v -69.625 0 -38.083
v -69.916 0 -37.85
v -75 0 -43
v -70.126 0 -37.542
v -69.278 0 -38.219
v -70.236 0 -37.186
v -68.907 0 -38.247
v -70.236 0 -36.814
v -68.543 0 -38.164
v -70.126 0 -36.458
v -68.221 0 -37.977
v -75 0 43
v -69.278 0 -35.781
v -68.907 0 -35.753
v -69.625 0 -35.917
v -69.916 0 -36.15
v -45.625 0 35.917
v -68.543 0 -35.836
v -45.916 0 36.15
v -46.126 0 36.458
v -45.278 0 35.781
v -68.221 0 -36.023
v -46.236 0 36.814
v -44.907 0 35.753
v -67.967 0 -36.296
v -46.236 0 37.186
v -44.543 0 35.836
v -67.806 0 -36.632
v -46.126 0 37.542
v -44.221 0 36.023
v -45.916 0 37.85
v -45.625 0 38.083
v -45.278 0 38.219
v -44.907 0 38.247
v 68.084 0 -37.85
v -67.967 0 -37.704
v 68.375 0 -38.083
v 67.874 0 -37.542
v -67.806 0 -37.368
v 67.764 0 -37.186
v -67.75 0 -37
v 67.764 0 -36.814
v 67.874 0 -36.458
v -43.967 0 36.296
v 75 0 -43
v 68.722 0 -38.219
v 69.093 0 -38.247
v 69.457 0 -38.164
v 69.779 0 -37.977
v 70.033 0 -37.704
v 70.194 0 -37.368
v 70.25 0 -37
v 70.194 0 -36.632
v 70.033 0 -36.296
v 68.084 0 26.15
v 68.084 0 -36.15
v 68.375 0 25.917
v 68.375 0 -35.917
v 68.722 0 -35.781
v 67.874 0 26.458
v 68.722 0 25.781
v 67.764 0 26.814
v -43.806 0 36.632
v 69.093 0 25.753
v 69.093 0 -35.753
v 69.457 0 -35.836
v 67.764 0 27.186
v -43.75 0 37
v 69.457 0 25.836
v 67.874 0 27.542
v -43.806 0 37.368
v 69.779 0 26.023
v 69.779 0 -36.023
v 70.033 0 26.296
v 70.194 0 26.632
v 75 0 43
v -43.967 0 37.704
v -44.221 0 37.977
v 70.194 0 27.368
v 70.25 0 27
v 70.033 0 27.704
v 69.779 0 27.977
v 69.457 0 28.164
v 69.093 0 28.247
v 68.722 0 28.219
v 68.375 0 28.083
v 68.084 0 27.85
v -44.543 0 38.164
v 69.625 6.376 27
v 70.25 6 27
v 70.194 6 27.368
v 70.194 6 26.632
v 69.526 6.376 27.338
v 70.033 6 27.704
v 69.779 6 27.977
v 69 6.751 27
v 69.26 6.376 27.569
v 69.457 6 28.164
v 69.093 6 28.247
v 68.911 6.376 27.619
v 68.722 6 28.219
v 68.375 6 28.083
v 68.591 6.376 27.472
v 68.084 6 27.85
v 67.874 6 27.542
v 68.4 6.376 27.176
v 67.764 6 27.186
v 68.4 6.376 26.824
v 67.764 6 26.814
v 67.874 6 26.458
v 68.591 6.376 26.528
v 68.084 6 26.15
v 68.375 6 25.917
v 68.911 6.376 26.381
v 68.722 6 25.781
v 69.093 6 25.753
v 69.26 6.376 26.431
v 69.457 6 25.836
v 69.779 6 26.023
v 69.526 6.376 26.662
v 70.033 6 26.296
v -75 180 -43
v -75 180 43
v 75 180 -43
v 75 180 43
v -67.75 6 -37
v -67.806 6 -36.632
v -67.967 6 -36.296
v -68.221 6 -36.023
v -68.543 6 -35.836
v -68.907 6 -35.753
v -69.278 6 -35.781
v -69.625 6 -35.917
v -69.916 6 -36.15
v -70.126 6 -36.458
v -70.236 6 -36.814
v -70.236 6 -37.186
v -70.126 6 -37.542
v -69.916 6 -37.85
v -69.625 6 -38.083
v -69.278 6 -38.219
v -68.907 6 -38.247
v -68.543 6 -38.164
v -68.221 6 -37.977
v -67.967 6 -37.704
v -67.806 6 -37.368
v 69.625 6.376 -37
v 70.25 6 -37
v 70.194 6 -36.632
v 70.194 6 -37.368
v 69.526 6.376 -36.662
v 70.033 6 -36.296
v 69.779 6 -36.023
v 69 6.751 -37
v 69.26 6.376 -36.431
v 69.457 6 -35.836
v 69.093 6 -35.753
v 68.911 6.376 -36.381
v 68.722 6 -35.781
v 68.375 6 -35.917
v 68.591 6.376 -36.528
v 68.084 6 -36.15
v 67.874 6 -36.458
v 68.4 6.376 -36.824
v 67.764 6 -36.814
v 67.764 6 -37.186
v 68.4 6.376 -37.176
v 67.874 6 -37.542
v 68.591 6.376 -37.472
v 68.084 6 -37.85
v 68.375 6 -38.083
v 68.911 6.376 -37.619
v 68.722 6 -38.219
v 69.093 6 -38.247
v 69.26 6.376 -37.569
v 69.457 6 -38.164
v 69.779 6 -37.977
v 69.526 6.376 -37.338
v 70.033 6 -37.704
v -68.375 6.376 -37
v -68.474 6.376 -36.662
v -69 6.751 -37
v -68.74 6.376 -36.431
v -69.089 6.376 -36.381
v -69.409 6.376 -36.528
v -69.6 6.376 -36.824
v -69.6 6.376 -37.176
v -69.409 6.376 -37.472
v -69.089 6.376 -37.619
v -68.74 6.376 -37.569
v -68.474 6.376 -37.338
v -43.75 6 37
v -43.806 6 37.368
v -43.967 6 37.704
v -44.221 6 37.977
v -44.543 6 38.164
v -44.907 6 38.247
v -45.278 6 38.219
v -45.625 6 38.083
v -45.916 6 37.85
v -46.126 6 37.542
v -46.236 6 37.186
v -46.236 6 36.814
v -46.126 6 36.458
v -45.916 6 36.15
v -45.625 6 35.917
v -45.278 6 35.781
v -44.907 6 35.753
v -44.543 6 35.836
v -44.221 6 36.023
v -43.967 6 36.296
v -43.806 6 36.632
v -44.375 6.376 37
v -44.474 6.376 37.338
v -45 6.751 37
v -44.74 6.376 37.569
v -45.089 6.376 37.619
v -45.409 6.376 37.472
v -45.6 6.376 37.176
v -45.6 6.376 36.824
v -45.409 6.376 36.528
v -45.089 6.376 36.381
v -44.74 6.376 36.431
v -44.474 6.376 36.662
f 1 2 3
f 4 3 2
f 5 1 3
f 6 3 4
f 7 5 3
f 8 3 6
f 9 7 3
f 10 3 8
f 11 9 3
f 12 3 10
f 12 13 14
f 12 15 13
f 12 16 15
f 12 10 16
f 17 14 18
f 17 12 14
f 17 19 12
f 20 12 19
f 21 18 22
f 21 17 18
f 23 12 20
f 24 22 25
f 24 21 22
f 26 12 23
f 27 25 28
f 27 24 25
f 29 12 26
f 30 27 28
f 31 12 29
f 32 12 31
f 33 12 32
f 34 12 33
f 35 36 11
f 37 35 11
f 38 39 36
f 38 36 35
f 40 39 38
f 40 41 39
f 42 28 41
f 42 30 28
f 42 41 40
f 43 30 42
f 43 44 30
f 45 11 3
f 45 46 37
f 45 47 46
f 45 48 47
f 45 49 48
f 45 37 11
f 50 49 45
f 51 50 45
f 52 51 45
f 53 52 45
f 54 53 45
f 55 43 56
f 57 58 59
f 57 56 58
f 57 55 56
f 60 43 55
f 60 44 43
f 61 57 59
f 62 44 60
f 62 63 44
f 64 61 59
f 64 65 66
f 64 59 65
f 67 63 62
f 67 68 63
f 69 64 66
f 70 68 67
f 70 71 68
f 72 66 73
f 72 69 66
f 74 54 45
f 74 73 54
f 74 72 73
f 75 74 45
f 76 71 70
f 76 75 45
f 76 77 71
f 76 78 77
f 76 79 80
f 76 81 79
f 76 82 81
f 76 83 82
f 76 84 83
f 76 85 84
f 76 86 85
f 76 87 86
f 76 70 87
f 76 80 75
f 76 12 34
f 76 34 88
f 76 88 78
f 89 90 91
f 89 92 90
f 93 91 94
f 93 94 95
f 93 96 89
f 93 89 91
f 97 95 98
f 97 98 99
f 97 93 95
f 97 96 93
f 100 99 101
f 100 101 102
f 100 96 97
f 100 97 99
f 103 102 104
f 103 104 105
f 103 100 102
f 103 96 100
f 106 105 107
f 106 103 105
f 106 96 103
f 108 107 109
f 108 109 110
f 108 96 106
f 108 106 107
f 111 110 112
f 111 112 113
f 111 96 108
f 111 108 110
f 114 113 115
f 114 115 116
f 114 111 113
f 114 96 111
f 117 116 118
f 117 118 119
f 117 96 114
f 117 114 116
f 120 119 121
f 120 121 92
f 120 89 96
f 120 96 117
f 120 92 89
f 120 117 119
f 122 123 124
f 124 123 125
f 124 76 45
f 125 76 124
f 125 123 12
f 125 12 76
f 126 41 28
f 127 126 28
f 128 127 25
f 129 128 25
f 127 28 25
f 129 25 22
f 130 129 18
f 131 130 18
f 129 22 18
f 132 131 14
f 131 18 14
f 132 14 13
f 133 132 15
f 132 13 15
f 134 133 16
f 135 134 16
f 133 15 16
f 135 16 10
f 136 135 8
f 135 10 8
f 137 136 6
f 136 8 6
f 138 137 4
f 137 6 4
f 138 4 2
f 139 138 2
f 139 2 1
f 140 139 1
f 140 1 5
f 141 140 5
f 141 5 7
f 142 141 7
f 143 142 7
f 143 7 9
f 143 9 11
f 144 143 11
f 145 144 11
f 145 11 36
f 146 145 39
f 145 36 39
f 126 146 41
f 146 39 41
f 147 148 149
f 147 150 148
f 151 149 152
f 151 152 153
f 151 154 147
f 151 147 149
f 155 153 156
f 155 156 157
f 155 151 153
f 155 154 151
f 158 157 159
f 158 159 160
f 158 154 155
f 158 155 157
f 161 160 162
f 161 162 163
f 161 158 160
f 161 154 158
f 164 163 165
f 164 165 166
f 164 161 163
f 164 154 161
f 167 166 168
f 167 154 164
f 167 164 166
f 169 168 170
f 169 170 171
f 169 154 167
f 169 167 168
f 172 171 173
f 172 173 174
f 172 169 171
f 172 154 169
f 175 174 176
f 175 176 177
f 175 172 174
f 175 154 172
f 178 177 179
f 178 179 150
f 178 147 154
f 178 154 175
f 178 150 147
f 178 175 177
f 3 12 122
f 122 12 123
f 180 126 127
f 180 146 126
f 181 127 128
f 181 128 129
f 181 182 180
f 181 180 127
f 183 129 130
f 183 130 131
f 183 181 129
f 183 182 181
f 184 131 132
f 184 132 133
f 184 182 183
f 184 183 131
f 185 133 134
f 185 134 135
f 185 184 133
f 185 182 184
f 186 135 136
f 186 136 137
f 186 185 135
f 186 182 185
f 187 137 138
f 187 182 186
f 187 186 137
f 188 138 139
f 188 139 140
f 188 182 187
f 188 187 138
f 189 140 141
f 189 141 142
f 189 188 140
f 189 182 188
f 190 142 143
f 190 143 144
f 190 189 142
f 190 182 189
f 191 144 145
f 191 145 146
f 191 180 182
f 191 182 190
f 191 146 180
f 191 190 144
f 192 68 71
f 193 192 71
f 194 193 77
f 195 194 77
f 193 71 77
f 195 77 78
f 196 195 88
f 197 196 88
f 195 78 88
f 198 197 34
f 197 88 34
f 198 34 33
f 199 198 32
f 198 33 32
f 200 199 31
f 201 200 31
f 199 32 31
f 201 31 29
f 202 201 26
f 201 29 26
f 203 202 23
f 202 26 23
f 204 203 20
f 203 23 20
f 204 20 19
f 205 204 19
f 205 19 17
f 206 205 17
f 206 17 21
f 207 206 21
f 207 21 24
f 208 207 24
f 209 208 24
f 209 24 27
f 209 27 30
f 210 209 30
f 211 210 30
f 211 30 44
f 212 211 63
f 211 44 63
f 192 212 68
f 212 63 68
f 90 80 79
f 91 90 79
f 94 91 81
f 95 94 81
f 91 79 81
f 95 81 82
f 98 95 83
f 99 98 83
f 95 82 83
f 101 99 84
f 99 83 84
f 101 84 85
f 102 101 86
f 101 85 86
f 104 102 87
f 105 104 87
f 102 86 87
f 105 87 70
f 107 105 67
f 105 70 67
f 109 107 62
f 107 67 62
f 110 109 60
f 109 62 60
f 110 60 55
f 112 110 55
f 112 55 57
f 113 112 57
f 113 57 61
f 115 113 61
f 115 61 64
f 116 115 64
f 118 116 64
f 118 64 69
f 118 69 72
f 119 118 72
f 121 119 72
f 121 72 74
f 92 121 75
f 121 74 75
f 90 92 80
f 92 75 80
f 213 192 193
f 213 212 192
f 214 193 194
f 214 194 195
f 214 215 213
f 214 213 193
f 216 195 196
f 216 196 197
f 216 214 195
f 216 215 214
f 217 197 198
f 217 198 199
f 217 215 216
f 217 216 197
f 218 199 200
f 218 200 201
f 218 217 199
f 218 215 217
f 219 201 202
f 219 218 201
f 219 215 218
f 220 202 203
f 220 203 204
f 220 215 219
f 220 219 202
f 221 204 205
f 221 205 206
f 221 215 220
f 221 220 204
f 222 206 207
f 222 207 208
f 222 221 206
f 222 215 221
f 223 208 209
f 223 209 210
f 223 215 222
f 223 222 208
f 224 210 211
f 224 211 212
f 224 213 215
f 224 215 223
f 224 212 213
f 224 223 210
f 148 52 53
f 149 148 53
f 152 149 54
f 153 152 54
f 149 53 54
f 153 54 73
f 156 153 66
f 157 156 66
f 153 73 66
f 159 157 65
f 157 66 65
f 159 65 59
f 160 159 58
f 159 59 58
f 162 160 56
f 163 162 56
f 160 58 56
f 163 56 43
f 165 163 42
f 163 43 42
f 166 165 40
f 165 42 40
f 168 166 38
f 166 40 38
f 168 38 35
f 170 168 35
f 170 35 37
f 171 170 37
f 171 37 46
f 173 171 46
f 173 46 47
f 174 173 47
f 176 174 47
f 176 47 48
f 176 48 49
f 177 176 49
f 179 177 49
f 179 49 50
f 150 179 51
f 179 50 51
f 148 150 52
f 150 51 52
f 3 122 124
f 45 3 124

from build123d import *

# Parameters (mm, degrees)
SKETCH_W    = 150
SKETCH_H    = 180
PAD_DEPTH   = 43
SKETCH001_R = 1.25
HOLE_DEPTH  = 6
HOLE_TIPS_R = 1.25


with BuildPart() as part:
    # Sketch → Pad (new body, symmetric)
    with BuildSketch(Plane.XY):
        with Locations((0, 90)):
            Rectangle(SKETCH_W, SKETCH_H)
    extrude(amount=PAD_DEPTH, both=True)

    # Sketch001 → Hole (cut)
    with BuildSketch(Plane.XZ):
        with Locations((69, -37)):
            Circle(SKETCH001_R)
        with Locations((69, 27)):
            Circle(SKETCH001_R)
        with Locations((-45, 37)):
            Circle(SKETCH001_R)
        with Locations((-69, -37)):
            Circle(SKETCH001_R)
    extrude(amount=-HOLE_DEPTH, mode=Mode.SUBTRACT)

    # Hole tips → Hole tip 1 section 0
    with BuildSketch(Plane.XZ.offset(-6), mode=Mode.PRIVATE) as hole_tip_1_s0:
        with Locations((69, -37)):
            Circle(HOLE_TIPS_R)
    loft([hole_tip_1_s0.sketch, Vertex(69, 6.751076, -37)], mode=Mode.SUBTRACT)

    # Hole tips → Hole tip 2 section 0
    with BuildSketch(Plane.XZ.offset(-6), mode=Mode.PRIVATE) as hole_tip_2_s0:
        with Locations((69, 27)):
            Circle(HOLE_TIPS_R)
    loft([hole_tip_2_s0.sketch, Vertex(69, 6.751076, 27)], mode=Mode.SUBTRACT)

    # Hole tips → Hole tip 3 section 0
    with BuildSketch(Plane.XZ.offset(-6), mode=Mode.PRIVATE) as hole_tip_3_s0:
        with Locations((-45, 37)):
            Circle(HOLE_TIPS_R)
    loft([hole_tip_3_s0.sketch, Vertex(-45, 6.751076, 37)], mode=Mode.SUBTRACT)

    # Hole tips → Hole tip 4 section 0
    with BuildSketch(Plane.XZ.offset(-6), mode=Mode.PRIVATE) as hole_tip_4_s0:
        with Locations((-69, -37)):
            Circle(HOLE_TIPS_R)
    loft([hole_tip_4_s0.sketch, Vertex(-69, 6.751076, -37)], mode=Mode.SUBTRACT)


solid = part.part
